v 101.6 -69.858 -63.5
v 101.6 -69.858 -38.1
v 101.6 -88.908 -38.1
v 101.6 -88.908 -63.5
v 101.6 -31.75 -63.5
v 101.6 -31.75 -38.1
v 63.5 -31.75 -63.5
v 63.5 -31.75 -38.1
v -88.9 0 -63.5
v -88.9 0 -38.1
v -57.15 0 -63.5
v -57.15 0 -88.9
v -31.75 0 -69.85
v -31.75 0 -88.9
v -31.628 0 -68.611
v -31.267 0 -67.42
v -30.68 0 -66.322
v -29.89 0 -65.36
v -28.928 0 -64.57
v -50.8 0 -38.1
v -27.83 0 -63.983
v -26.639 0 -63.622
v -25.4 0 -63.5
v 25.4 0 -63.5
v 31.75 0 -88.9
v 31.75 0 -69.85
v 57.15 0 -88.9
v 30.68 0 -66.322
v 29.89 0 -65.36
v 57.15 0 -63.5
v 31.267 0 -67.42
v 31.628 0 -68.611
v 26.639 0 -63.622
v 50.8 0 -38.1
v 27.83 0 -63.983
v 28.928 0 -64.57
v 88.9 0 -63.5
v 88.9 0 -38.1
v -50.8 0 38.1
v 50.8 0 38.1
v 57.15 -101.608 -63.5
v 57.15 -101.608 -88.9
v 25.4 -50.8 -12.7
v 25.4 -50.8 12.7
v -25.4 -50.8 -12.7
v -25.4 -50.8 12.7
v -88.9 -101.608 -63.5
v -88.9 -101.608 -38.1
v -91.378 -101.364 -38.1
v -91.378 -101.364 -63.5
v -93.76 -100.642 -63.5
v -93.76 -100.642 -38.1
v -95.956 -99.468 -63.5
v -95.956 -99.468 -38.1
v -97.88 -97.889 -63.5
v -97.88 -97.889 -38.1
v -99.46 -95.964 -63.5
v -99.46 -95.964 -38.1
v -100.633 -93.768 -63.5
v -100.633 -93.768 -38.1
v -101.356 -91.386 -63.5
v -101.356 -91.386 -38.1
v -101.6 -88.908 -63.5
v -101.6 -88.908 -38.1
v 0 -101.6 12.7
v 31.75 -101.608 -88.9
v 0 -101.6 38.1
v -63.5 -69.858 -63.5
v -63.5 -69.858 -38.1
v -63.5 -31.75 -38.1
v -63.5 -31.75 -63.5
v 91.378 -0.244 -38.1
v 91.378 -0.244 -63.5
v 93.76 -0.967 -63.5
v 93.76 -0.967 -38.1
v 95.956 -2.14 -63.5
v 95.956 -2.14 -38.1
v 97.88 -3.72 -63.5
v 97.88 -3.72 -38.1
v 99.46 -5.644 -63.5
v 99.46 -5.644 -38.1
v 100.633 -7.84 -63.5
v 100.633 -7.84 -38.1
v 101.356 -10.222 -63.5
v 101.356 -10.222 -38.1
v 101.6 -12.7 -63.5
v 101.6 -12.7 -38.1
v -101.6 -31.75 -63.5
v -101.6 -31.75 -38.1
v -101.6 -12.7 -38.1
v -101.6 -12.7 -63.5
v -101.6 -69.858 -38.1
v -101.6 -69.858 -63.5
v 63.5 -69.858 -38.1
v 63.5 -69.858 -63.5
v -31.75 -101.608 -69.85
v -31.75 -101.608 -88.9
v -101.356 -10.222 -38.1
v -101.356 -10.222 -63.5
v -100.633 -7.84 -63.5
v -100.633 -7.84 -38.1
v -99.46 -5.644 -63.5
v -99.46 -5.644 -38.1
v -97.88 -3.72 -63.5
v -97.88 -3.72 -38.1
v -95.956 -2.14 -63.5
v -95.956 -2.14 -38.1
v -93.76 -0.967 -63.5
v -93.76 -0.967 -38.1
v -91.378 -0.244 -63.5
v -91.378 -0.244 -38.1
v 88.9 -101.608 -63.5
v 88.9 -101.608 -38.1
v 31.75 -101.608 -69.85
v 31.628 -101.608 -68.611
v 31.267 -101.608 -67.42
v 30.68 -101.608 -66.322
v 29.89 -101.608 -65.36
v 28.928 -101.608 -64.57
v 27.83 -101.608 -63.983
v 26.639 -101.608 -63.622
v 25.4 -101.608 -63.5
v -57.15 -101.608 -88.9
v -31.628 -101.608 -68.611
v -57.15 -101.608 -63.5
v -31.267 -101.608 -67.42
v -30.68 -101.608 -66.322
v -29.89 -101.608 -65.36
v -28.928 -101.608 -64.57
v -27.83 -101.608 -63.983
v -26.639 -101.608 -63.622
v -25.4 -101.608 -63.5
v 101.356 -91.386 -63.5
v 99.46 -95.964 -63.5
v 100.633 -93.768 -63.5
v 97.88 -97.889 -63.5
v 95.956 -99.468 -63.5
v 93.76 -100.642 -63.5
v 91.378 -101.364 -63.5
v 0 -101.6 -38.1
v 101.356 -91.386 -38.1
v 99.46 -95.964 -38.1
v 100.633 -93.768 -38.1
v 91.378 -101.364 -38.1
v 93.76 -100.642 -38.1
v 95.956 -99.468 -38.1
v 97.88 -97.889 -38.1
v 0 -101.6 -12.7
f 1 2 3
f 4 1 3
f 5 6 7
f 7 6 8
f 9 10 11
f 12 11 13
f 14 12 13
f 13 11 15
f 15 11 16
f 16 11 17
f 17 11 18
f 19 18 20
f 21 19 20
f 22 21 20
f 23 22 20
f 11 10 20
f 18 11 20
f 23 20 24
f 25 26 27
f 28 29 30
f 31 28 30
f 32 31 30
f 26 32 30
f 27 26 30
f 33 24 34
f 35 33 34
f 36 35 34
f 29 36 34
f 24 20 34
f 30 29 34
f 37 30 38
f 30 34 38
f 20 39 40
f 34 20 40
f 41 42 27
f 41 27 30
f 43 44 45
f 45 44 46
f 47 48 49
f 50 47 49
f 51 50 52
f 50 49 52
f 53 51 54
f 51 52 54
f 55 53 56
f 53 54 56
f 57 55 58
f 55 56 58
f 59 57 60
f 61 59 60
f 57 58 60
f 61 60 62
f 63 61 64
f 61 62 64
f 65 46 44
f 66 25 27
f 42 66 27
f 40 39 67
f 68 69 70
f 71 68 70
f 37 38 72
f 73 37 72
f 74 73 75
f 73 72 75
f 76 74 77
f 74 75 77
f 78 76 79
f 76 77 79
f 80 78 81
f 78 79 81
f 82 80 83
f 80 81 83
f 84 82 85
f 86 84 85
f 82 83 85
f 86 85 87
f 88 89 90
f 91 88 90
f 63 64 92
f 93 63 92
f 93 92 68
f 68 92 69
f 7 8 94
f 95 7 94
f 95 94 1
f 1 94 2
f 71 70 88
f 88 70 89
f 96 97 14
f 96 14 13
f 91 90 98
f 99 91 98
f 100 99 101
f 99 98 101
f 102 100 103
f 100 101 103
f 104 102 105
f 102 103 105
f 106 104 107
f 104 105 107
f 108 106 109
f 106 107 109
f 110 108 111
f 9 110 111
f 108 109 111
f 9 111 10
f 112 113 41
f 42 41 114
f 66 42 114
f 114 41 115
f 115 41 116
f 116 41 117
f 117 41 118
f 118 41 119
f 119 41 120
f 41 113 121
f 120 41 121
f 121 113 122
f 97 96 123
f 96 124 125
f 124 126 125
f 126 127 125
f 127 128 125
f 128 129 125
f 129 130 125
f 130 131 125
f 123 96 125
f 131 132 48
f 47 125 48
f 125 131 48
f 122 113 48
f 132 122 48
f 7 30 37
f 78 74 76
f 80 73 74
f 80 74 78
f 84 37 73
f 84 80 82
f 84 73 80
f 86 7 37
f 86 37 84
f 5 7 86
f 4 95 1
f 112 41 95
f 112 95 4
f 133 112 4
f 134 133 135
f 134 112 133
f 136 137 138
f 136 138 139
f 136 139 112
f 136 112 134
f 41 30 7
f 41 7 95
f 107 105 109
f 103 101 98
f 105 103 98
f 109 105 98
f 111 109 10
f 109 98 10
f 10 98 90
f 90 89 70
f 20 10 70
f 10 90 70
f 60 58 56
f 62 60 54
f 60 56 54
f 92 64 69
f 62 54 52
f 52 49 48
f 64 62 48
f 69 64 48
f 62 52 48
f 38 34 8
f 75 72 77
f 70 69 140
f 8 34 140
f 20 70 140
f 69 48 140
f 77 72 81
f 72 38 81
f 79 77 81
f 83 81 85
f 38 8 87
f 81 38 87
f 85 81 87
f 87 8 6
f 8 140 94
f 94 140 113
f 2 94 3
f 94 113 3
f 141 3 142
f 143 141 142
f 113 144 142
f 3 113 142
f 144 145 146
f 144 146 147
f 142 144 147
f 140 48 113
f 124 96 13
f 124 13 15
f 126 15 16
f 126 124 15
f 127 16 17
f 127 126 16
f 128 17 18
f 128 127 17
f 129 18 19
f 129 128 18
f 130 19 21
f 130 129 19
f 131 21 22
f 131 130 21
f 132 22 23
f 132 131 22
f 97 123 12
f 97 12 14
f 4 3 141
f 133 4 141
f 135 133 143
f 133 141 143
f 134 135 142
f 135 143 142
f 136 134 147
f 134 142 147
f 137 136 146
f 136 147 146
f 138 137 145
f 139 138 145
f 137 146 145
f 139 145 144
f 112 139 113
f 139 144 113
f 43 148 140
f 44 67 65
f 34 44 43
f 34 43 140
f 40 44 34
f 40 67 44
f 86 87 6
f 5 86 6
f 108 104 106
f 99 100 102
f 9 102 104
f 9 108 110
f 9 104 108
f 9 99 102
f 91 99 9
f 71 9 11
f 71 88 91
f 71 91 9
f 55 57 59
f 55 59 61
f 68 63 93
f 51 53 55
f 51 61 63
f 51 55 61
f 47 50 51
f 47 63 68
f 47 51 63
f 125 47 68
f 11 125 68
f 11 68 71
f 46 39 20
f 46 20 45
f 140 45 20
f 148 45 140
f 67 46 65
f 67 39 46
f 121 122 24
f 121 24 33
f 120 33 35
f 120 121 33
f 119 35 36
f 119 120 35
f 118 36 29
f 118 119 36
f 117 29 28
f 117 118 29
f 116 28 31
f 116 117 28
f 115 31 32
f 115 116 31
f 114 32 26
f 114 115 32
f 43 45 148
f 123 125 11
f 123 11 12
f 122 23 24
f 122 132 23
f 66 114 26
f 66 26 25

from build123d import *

# Parameters (mm, degrees)
F1_DEPTH = 38.1
F2_DEPTH = 12.7
F4_DEPTH = 25.4
F6_DEPTH = 101.608358


with BuildPart() as f1:
    # F0 (on Top) → F1 (new body, symmetric)
    with BuildSketch(Plane.XY):
        Polygon((25.4, -50.8), (-25.4, -50.8), (0, -101.6), align=None)
        Polygon((50.8, 0), (-50.8, 0), (-25.4, -50.8), (25.4, -50.8), align=None)
    extrude(amount=F1_DEPTH, both=True)

    # F0 (on Top) → F2 (cut, symmetric)
    with BuildSketch(Plane.XY):
        Polygon((25.4, -50.8), (-25.4, -50.8), (0, -101.6), align=None)
    extrude(amount=F2_DEPTH, both=True, mode=Mode.SUBTRACT)

    # F3 (on face) → F4 (join)
    with BuildSketch(Plane(origin=(0, 0, -38.1), x_dir=(1, 0, 0), z_dir=(0, 0, -1))):
        Polygon((0, 101.6), (-50.8, 0), (50.8, 0), align=None)
        with BuildLine():
            ThreePointArc((-101.6, 12.7), (-97.880256, 3.719744), (-88.9, 0))
            Line((-88.9, 0), (-50.8, 0))
            Line((-50.8, 0), (0, 101.6))
            Line((0, 101.6), (50.8, 0))
            Line((50.8, 0), (88.9, 0))
            ThreePointArc((88.9, 0), (97.880256, 3.719744), (101.6, 12.7))
            Line((101.6, 12.7), (101.6, 31.75))
            Line((101.6, 31.75), (63.5, 31.75))
            Line((63.5, 31.75), (63.5, 69.858358))
            Line((63.5, 69.858358), (101.6, 69.858358))
            Line((101.6, 69.858358), (101.6, 88.908358))
            ThreePointArc((101.6, 88.908358), (97.880256, 97.888614), (88.9, 101.608358))
            Line((88.9, 101.608358), (-88.9, 101.608358))
            ThreePointArc((-88.9, 101.608358), (-97.880256, 97.888614), (-101.6, 88.908358))
            Line((-101.6, 88.908358), (-101.6, 69.858358))
            Line((-101.6, 69.858358), (-63.5, 69.858358))
            Line((-63.5, 69.858358), (-63.5, 31.75))
            Line((-63.5, 31.75), (-101.6, 31.75))
            Line((-101.6, 31.75), (-101.6, 12.7))
        make_face()
    extrude(amount=F4_DEPTH)

    # F5 (on face) → F6 (join, through all)
    with BuildSketch(Plane.XZ.offset(101.608358)):
        Polygon((-31.75, -63.5), (-57.15, -63.5), (-57.15, -88.9), (-31.75, -88.9), (-31.75, -69.85), align=None)
        with BuildLine():
            Line((-25.4, -63.5), (-31.75, -63.5))
            Line((-31.75, -63.5), (-31.75, -69.85))
            ThreePointArc((-31.75, -69.85), (-29.890128, -65.359872), (-25.4, -63.5))
        make_face()
        with BuildLine():
            Line((31.75, -63.5), (25.4, -63.5))
            ThreePointArc((25.4, -63.5), (29.890128, -65.359872), (31.75, -69.85))
            Line((31.75, -69.85), (31.75, -63.5))
        make_face()
        Polygon((31.75, -63.5), (31.75, -69.85), (31.75, -88.9), (57.15, -88.9), (57.15, -63.5), align=None)
    extrude(amount=-F6_DEPTH)


solid = f1.part
